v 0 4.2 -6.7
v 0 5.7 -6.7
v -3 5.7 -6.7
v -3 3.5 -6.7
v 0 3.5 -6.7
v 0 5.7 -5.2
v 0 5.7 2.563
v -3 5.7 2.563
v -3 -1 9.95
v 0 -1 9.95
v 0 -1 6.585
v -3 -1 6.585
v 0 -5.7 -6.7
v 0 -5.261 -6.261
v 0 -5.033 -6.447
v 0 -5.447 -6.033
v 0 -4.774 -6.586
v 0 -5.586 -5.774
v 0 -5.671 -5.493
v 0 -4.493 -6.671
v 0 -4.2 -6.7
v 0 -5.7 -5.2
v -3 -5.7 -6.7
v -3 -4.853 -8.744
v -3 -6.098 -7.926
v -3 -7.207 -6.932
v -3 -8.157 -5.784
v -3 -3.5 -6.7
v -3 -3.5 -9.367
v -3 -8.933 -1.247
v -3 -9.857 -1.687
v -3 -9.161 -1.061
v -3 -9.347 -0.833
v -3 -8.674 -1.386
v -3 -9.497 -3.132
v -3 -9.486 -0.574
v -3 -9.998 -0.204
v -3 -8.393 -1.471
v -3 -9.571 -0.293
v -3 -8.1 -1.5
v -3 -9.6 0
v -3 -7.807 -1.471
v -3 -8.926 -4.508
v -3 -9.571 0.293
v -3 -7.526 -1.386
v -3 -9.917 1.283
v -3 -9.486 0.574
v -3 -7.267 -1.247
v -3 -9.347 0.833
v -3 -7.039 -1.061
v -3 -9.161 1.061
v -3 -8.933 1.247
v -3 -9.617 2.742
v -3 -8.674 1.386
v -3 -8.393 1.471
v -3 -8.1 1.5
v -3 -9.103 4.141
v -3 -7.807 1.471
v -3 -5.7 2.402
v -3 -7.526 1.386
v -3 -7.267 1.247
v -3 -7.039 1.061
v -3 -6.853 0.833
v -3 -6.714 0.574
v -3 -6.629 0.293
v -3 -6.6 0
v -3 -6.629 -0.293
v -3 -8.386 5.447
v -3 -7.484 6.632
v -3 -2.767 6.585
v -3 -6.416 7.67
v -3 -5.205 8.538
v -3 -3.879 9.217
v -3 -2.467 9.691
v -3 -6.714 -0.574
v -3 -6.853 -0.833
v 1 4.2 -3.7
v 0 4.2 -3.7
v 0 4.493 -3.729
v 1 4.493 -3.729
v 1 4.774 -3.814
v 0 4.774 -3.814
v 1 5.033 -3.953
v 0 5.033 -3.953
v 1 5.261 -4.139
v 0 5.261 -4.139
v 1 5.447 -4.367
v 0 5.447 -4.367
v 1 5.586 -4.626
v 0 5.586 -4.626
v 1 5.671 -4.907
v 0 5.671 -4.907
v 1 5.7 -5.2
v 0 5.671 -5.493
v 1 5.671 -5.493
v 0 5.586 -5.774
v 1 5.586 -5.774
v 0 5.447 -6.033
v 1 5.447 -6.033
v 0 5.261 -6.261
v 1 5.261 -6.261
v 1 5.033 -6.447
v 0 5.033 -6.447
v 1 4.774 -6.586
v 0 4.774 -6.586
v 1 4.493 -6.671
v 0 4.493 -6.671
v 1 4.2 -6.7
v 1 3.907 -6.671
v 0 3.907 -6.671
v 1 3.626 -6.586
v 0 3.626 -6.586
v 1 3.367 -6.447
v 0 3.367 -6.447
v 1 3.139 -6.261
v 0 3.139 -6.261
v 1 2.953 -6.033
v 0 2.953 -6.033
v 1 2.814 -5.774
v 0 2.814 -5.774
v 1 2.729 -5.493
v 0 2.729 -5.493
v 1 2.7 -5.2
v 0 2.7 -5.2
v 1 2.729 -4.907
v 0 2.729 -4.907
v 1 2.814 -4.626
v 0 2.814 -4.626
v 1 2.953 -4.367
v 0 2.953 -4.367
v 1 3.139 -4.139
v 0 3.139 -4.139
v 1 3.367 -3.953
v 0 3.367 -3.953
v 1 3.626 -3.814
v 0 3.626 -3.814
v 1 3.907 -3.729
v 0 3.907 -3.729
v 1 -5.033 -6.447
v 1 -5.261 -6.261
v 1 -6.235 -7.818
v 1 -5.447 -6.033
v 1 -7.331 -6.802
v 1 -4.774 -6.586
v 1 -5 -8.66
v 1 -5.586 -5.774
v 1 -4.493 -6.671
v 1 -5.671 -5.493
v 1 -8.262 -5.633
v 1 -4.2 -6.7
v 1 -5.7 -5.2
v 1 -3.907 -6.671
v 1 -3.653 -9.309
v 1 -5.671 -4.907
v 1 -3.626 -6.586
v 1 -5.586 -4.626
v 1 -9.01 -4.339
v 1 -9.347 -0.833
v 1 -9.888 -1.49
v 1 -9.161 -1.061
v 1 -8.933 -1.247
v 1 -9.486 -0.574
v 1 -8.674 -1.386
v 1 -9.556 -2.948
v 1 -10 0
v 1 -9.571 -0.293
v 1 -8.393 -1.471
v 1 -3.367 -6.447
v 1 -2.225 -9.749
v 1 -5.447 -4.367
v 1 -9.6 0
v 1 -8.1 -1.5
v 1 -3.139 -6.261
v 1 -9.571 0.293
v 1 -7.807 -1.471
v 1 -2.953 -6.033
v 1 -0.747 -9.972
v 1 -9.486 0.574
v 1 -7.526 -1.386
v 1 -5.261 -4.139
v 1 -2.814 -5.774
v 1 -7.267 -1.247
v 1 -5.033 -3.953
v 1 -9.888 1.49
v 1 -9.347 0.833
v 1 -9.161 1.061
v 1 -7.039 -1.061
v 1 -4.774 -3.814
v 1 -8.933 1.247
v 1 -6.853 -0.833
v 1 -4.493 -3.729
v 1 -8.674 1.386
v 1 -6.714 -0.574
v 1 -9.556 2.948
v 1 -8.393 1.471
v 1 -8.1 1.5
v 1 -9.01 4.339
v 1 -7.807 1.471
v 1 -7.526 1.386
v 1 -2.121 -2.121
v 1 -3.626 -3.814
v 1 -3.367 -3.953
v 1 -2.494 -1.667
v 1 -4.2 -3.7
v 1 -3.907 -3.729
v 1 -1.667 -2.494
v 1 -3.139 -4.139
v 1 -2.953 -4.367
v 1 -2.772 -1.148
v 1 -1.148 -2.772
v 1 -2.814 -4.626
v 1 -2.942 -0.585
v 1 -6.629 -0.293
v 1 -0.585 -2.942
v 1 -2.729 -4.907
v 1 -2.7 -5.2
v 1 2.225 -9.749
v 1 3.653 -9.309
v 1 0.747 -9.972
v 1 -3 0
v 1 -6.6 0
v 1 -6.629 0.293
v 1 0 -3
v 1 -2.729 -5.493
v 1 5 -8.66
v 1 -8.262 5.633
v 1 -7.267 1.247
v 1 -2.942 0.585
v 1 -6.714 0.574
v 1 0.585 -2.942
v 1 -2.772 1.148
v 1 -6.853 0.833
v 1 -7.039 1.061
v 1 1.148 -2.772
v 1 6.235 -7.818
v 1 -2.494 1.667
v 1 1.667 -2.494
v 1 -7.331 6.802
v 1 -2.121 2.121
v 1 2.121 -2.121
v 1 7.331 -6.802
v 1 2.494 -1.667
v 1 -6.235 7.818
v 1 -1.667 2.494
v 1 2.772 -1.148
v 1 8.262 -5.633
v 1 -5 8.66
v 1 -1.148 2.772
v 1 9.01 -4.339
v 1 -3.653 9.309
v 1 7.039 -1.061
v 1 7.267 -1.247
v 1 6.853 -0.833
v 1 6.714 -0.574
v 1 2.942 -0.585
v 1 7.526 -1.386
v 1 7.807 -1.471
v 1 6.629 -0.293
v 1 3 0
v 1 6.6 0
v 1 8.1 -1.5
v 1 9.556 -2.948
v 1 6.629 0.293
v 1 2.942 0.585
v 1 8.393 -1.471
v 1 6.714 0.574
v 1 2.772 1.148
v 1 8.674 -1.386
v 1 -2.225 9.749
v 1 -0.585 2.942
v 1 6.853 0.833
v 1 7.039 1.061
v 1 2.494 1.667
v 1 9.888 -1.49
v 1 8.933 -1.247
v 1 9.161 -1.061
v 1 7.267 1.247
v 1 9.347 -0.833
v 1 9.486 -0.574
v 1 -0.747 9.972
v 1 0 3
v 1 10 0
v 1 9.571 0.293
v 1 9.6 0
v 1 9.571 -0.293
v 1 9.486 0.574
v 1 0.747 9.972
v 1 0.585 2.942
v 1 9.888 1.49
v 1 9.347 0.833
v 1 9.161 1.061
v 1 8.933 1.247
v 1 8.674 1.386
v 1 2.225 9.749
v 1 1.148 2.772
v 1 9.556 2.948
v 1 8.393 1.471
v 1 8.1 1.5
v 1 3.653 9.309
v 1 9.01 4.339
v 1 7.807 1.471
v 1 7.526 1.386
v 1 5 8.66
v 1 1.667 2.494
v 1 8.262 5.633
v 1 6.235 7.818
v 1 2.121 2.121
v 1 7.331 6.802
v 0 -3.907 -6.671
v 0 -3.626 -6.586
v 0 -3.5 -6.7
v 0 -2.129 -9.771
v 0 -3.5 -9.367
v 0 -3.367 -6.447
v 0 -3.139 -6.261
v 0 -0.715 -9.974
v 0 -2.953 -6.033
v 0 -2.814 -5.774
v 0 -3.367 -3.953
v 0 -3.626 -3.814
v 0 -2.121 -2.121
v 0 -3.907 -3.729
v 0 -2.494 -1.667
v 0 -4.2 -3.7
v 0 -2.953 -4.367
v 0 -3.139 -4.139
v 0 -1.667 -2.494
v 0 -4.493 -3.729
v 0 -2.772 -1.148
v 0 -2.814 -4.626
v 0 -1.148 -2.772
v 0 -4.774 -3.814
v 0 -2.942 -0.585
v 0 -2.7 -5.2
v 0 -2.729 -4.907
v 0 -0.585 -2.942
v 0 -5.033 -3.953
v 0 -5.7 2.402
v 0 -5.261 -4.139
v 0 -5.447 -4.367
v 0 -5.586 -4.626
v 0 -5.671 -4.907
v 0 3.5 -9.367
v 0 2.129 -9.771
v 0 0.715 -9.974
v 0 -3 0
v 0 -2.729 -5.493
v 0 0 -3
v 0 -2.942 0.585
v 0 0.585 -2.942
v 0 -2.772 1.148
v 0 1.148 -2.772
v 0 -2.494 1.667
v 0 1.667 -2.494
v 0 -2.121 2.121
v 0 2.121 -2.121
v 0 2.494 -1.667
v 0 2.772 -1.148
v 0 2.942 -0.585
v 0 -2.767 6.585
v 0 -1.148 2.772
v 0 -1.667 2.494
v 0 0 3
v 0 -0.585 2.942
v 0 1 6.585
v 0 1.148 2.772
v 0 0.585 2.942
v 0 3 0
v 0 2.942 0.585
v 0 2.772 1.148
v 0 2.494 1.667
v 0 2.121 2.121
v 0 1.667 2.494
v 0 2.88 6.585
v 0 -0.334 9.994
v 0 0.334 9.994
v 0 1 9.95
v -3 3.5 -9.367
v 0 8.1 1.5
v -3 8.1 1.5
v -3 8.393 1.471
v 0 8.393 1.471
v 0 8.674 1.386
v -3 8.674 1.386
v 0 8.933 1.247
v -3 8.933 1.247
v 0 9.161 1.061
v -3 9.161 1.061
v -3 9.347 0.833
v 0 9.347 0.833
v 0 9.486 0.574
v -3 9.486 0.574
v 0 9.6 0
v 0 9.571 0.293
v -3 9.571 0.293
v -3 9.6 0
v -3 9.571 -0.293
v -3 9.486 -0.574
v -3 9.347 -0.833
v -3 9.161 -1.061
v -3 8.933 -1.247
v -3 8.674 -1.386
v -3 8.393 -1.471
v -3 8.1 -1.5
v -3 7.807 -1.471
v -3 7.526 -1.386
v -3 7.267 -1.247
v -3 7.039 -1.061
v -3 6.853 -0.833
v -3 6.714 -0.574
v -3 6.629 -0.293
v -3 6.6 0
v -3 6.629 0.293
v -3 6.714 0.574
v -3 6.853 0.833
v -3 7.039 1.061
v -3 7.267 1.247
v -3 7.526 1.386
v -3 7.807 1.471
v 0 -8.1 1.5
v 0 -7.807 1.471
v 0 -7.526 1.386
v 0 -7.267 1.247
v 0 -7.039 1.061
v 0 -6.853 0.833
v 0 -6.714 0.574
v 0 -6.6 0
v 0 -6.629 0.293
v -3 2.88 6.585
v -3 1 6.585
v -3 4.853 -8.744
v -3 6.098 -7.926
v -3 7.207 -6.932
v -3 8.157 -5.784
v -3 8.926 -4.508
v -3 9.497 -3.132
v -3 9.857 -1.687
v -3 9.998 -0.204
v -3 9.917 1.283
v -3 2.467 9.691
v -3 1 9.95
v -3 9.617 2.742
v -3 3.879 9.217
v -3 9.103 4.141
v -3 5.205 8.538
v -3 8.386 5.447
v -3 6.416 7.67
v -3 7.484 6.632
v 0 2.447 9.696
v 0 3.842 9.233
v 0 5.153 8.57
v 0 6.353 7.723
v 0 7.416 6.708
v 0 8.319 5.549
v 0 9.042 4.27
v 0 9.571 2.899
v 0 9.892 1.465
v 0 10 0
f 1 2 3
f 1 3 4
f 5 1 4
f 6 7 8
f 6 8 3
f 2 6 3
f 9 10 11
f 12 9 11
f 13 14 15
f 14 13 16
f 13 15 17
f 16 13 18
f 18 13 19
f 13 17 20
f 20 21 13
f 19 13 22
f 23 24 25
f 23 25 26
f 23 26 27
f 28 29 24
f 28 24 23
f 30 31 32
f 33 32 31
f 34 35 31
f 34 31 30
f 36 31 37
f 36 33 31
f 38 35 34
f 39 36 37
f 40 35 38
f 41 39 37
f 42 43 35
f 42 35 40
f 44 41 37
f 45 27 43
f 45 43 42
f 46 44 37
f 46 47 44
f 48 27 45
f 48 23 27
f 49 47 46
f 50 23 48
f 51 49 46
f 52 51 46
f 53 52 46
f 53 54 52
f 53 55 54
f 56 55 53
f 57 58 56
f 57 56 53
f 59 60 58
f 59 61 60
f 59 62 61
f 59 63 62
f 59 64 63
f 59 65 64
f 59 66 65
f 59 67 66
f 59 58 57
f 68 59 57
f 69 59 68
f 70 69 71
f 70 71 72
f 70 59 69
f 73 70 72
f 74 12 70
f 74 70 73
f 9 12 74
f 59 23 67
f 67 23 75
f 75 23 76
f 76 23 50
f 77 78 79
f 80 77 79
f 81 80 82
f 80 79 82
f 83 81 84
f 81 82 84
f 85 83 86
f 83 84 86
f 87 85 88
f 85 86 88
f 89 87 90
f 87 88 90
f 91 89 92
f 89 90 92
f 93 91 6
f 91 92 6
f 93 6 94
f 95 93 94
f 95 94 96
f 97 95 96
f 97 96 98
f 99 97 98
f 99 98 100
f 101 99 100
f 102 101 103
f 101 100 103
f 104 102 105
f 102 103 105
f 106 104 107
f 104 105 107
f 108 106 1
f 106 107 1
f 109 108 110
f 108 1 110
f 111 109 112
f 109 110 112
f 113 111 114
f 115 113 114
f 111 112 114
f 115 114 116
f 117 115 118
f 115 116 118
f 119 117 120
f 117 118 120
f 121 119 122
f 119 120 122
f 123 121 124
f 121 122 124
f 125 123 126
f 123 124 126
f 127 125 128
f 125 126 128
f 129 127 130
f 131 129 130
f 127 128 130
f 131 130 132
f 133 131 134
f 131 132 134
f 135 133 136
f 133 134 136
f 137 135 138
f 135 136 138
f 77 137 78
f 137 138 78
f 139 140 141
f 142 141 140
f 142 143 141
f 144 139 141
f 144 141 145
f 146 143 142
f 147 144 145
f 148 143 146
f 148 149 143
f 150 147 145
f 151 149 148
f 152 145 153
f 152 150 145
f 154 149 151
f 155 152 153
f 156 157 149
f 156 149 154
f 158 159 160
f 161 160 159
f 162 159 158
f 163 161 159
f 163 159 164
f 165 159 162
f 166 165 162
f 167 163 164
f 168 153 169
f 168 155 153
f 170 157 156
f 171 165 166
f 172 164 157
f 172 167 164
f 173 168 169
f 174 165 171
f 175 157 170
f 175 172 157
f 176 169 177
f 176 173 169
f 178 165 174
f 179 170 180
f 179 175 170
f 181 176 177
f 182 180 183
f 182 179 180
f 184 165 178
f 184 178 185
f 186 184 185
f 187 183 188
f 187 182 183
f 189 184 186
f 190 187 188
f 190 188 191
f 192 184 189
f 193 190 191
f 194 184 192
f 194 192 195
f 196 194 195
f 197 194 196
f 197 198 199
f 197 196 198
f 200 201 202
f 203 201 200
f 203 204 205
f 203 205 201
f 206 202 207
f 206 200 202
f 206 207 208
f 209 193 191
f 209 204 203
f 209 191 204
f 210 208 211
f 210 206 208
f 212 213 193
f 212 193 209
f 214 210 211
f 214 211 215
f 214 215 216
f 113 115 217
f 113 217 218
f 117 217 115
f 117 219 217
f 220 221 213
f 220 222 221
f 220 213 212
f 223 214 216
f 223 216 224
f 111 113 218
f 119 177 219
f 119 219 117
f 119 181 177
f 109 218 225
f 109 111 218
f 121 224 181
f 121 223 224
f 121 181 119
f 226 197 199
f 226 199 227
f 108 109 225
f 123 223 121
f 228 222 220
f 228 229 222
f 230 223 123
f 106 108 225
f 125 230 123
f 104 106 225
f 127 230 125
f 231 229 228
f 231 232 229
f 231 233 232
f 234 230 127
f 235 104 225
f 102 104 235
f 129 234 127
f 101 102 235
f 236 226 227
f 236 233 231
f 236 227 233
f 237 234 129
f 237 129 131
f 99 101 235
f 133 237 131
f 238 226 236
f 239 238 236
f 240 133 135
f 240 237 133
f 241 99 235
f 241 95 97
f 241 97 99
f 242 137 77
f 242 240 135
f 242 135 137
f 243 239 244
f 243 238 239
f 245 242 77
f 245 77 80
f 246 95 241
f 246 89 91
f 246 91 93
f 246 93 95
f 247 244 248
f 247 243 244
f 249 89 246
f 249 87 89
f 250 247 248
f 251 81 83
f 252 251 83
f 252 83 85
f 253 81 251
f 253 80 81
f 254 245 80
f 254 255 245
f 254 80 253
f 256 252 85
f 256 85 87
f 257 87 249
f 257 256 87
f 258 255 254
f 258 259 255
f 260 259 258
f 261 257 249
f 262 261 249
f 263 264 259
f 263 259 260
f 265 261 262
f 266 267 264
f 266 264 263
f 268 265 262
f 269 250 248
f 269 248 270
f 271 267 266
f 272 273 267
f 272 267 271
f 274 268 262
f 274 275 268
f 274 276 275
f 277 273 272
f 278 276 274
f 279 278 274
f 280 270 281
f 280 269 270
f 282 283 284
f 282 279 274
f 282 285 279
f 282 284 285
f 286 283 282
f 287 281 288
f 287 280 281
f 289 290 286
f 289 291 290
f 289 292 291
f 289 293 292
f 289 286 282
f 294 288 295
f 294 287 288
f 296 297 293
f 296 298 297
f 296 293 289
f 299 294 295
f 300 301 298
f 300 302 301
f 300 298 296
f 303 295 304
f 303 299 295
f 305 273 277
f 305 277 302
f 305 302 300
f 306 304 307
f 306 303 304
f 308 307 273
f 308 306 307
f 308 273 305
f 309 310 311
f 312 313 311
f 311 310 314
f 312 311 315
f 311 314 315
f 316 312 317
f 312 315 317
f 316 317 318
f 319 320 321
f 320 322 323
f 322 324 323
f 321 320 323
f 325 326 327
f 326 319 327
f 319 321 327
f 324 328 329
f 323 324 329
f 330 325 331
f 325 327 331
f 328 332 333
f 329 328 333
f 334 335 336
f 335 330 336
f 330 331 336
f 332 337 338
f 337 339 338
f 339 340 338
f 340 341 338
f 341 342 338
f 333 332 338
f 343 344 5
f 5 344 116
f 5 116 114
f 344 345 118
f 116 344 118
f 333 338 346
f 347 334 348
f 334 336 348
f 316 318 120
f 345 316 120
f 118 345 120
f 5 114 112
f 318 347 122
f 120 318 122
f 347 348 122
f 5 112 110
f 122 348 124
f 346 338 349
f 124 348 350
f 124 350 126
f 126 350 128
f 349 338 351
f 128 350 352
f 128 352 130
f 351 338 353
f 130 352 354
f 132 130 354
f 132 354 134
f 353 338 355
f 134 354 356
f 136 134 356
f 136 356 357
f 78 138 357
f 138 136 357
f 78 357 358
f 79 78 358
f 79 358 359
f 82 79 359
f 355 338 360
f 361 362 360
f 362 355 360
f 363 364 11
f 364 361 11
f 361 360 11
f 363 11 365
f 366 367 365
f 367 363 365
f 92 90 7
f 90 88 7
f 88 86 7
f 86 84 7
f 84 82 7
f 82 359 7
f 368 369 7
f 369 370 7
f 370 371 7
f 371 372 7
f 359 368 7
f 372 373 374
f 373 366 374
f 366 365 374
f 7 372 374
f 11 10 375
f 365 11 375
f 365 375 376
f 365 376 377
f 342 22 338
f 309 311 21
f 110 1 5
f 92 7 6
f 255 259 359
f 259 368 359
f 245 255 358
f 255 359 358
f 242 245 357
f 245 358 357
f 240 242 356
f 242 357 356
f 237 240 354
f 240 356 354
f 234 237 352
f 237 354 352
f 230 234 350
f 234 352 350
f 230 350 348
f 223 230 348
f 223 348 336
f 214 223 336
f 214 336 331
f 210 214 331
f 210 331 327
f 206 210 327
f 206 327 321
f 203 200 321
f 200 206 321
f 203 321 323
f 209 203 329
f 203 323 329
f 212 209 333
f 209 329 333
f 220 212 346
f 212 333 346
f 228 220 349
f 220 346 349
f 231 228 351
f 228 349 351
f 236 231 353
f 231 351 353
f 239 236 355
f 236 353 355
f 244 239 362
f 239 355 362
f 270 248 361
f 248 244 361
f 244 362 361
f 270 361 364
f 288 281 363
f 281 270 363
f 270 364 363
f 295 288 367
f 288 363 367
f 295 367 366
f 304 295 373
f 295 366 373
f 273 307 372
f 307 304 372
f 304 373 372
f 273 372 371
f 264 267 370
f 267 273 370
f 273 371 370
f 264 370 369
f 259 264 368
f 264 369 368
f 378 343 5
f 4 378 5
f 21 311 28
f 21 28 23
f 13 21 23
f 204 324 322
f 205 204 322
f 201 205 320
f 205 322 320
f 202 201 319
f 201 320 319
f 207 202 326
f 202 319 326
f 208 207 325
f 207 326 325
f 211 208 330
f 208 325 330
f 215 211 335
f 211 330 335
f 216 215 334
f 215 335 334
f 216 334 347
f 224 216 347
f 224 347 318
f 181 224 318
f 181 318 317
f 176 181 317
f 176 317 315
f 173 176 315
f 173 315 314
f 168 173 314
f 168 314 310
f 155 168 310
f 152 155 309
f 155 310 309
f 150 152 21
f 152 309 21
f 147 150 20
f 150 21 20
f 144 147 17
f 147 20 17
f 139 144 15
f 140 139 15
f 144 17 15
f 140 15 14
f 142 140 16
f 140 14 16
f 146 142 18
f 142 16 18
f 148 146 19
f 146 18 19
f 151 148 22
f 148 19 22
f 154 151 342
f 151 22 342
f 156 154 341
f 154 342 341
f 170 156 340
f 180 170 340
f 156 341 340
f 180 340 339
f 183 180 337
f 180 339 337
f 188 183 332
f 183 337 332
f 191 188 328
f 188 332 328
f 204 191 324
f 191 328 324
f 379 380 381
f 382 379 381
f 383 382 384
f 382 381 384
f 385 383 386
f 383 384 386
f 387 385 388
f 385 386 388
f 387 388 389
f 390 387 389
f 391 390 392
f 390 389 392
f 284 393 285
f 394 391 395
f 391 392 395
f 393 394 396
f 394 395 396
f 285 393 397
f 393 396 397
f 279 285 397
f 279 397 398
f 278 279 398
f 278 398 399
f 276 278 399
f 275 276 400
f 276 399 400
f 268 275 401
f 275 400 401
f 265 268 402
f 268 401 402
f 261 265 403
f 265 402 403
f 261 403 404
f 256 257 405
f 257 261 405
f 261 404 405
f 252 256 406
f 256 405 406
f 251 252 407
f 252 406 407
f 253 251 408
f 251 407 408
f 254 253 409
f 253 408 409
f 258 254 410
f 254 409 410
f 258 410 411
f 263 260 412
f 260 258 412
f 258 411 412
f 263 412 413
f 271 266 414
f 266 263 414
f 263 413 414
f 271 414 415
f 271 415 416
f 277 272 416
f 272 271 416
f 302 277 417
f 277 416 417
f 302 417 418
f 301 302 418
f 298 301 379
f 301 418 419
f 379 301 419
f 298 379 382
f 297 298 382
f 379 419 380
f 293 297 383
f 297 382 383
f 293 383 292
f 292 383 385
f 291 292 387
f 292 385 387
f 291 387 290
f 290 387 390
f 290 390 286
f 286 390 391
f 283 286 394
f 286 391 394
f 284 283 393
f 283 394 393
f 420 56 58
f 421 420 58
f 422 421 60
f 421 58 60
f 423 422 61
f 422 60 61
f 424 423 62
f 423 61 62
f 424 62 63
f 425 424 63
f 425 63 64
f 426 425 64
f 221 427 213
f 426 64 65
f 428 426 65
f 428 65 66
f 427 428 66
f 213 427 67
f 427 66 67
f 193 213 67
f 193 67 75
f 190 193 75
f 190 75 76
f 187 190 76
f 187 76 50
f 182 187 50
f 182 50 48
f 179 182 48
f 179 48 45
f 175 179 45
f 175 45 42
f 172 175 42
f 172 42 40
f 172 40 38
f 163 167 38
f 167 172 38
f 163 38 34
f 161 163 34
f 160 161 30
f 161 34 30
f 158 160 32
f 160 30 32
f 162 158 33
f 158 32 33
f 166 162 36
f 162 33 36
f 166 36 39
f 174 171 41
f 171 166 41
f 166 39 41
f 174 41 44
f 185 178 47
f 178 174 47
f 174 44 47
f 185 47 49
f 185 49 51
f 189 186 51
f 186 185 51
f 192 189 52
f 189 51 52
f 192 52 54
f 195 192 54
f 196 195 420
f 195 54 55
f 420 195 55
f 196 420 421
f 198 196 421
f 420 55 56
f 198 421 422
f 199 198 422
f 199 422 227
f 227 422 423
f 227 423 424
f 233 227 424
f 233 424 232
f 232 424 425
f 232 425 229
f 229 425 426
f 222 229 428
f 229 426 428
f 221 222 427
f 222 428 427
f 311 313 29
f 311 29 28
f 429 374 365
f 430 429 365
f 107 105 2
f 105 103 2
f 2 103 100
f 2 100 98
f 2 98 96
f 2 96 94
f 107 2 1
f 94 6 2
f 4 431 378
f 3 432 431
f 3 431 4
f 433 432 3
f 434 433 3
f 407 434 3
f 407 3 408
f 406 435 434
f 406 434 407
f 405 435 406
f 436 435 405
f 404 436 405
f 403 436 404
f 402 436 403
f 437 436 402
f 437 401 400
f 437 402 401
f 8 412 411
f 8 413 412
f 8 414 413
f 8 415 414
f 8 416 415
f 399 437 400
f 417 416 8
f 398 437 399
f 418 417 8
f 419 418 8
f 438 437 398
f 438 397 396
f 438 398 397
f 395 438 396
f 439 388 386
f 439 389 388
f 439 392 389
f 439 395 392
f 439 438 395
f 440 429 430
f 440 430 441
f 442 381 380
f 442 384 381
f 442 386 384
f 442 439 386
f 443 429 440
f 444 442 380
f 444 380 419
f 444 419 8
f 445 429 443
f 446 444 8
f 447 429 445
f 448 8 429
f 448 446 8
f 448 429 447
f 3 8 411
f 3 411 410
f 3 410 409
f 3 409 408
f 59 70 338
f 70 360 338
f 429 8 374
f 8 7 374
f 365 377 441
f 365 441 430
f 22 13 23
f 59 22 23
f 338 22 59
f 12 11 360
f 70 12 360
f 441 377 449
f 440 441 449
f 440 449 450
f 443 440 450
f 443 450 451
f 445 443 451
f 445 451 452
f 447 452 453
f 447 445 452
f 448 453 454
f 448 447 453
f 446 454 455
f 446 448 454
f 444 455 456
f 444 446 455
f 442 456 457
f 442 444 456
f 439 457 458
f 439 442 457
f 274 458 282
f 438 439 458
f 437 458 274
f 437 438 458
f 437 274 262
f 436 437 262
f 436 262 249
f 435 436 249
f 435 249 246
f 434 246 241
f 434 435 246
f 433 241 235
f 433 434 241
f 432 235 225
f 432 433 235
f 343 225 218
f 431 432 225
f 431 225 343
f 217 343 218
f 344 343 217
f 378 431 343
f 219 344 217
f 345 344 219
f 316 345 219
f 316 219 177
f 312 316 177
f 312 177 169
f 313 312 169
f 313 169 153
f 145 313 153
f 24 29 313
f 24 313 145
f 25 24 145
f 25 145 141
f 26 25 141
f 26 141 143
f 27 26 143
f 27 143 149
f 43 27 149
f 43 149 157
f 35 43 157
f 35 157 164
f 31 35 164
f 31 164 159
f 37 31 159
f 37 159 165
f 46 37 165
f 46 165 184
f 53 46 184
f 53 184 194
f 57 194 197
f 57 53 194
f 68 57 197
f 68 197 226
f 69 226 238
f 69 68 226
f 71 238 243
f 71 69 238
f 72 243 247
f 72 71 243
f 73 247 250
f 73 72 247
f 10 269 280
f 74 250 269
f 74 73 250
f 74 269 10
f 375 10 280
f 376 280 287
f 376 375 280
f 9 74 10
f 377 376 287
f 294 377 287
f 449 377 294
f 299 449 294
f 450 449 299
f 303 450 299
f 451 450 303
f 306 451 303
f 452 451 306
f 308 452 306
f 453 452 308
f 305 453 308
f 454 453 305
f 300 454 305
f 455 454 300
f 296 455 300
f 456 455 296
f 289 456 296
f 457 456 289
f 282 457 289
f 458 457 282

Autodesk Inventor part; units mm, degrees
ref_plane "YZ Plane" through (0, 0, 0) normal (1, 0, 0) x (0, 1, 0)
ref_plane "XZ Plane" through (0, 0, 0) normal (0, 1, 0) x (-1, 0, 0)
ref_plane "XY Plane" through (0, 0, 0) normal (0, 0, 1) x (1, 0, 0)
sketch "Sketch1" plane through (0, 0, 0) normal (1, 0, 0) x (0, 1, 0)
  circle A0 centre (0, 0) radius 10
  line L0 (10, 0) -> (8.1, 0)
  circle A1 centre (8.1, 0) radius 1.5
  circle A2 centre (0, 0) radius 3
  circle A3 centre (-8.1, 0) radius 1.5
  dimension "d0" = 20
  dimension "d1" = 1.9
  dimension "d2" = 3
  dimension "d3" = 6
  dimension "d29" = 360
extrude "Extrusion1" add sketch "Sketch1" along normal blind 1
sketch "Sketch2" plane through (0, 0, 0) normal (-1, 0, 0) x (0, 0, 1)
  line L0 (0, 5.5) -> (-6.5, 5.5)
  line L1 (0, 5.5) -> (2.5, 5.5)
  line L2 (6.0478, 3.0122) -> (6.0478, -2.8019)
  line L3 (-6.5, -5.5) -> (-6.5, 5.5)
  line L4 (5.5, 5.498) -> (2.5, 5.5)
  line L5 (2.5, 5.5) -> (6.0478, 3.0122)
  line L6 (5.2, -5.498) -> (2.2, -5.5)
  line L7 (2.2, -5.5) -> (6.0478, -2.8019)
  line L8 (2.2, -5.5) -> (-6.5, -5.5)
  line L9 (2.5631, 5.7) -> (6.585, 2.8798)
  line L10 (6.585, 2.8798) -> (6.585, -2.7667)
  line L11 (6.585, -2.7667) -> (2.4018, -5.7)
  line L12 (2.5631, 5.7) -> (0, 5.7)
  line L13 (0, 5.7) -> (-6.7, 5.7)
  line L14 (-6.7, 5.7) -> (-6.7, -5.7)
  line L15 (-6.7, -5.7) -> (2.4018, -5.7)
  circle A0 centre (0, 0) radius 10
  circle A1 centre (0, 0) radius 10 projected
  line L16 (10, 0) -> (10, 1)
  line L17 (10, 1) -> (6.585, 1)
  line L18 (10, 0) -> (10, -1)
  line L19 (10, 0) -> (11, 0) construction
  line L20 (10, -1) -> (6.585, -1)
  line L21 (-10, 0) -> (-10, 3.5)
  line L22 (-10, 3.5) -> (-6.7, 3.5)
  line L23 (-10, 0) -> (-10, -3.5)
  line L24 (-10, -3.5) -> (-6.7, -3.5)
  circle A2 centre (0, 8.1) radius 1.5 projected
  circle A3 centre (0, 8.1) radius 1.5
  circle A4 centre (0, -8.1) radius 1.5
  point P0 (-9.3675, -3.5)
  point P1 (9.9499, -1)
  point P2 (9.9499, 1)
  point P3 (-9.3675, 3.5)
  dimension "d6" = 5.5
  dimension "d7" = 6.5
  dimension "d8" = 5.5
  dimension "d9" = 11
  dimension "d10" = 3
  dimension "d11" = 35
  dimension "d12" = 3
  dimension "d13" = 35
  dimension "d14" = 0.2
  dimension "d15" = 0.2
  dimension "d18" = 1
  dimension "d19" = 1
  dimension "d20" = 270
  dimension "d21" = 3.5
  dimension "d22" = 3.5
  dimension "d33" = 360
extrude "Extrusion2" add sketch "Sketch2" along normal blind 3 contours L9 L12 L13 L14 L22 A0 L17 L10 | L11 L10 L20 A0 L24 L14 L15
sketch "Sketch3" plane through (0, 0, 0) normal (-1, 0, 0) x (0, 0, 1)
  circle A0 centre (-5.2, 4.2) radius 1.5
  circle A1 centre (-5.2, -4.2) radius 1.5
  line L0 (-6.7, 5.7) -> (2.5631, 5.7) projected
  line L1 (-6.7, 3.5) -> (-6.7, 5.7) projected
  line L2 (-6.7, -5.7) -> (-6.7, -3.5) projected
  line L3 (2.4018, -5.7) -> (-6.7, -5.7) projected
  point P0 (0, 0)
  dimension "d23" = 3
  dimension "d24" = 3
extrude "Extrusion3" cut sketch "Sketch3" against normal blind 10 contours A0 | A1
properties part number "potentiometer_holder"
